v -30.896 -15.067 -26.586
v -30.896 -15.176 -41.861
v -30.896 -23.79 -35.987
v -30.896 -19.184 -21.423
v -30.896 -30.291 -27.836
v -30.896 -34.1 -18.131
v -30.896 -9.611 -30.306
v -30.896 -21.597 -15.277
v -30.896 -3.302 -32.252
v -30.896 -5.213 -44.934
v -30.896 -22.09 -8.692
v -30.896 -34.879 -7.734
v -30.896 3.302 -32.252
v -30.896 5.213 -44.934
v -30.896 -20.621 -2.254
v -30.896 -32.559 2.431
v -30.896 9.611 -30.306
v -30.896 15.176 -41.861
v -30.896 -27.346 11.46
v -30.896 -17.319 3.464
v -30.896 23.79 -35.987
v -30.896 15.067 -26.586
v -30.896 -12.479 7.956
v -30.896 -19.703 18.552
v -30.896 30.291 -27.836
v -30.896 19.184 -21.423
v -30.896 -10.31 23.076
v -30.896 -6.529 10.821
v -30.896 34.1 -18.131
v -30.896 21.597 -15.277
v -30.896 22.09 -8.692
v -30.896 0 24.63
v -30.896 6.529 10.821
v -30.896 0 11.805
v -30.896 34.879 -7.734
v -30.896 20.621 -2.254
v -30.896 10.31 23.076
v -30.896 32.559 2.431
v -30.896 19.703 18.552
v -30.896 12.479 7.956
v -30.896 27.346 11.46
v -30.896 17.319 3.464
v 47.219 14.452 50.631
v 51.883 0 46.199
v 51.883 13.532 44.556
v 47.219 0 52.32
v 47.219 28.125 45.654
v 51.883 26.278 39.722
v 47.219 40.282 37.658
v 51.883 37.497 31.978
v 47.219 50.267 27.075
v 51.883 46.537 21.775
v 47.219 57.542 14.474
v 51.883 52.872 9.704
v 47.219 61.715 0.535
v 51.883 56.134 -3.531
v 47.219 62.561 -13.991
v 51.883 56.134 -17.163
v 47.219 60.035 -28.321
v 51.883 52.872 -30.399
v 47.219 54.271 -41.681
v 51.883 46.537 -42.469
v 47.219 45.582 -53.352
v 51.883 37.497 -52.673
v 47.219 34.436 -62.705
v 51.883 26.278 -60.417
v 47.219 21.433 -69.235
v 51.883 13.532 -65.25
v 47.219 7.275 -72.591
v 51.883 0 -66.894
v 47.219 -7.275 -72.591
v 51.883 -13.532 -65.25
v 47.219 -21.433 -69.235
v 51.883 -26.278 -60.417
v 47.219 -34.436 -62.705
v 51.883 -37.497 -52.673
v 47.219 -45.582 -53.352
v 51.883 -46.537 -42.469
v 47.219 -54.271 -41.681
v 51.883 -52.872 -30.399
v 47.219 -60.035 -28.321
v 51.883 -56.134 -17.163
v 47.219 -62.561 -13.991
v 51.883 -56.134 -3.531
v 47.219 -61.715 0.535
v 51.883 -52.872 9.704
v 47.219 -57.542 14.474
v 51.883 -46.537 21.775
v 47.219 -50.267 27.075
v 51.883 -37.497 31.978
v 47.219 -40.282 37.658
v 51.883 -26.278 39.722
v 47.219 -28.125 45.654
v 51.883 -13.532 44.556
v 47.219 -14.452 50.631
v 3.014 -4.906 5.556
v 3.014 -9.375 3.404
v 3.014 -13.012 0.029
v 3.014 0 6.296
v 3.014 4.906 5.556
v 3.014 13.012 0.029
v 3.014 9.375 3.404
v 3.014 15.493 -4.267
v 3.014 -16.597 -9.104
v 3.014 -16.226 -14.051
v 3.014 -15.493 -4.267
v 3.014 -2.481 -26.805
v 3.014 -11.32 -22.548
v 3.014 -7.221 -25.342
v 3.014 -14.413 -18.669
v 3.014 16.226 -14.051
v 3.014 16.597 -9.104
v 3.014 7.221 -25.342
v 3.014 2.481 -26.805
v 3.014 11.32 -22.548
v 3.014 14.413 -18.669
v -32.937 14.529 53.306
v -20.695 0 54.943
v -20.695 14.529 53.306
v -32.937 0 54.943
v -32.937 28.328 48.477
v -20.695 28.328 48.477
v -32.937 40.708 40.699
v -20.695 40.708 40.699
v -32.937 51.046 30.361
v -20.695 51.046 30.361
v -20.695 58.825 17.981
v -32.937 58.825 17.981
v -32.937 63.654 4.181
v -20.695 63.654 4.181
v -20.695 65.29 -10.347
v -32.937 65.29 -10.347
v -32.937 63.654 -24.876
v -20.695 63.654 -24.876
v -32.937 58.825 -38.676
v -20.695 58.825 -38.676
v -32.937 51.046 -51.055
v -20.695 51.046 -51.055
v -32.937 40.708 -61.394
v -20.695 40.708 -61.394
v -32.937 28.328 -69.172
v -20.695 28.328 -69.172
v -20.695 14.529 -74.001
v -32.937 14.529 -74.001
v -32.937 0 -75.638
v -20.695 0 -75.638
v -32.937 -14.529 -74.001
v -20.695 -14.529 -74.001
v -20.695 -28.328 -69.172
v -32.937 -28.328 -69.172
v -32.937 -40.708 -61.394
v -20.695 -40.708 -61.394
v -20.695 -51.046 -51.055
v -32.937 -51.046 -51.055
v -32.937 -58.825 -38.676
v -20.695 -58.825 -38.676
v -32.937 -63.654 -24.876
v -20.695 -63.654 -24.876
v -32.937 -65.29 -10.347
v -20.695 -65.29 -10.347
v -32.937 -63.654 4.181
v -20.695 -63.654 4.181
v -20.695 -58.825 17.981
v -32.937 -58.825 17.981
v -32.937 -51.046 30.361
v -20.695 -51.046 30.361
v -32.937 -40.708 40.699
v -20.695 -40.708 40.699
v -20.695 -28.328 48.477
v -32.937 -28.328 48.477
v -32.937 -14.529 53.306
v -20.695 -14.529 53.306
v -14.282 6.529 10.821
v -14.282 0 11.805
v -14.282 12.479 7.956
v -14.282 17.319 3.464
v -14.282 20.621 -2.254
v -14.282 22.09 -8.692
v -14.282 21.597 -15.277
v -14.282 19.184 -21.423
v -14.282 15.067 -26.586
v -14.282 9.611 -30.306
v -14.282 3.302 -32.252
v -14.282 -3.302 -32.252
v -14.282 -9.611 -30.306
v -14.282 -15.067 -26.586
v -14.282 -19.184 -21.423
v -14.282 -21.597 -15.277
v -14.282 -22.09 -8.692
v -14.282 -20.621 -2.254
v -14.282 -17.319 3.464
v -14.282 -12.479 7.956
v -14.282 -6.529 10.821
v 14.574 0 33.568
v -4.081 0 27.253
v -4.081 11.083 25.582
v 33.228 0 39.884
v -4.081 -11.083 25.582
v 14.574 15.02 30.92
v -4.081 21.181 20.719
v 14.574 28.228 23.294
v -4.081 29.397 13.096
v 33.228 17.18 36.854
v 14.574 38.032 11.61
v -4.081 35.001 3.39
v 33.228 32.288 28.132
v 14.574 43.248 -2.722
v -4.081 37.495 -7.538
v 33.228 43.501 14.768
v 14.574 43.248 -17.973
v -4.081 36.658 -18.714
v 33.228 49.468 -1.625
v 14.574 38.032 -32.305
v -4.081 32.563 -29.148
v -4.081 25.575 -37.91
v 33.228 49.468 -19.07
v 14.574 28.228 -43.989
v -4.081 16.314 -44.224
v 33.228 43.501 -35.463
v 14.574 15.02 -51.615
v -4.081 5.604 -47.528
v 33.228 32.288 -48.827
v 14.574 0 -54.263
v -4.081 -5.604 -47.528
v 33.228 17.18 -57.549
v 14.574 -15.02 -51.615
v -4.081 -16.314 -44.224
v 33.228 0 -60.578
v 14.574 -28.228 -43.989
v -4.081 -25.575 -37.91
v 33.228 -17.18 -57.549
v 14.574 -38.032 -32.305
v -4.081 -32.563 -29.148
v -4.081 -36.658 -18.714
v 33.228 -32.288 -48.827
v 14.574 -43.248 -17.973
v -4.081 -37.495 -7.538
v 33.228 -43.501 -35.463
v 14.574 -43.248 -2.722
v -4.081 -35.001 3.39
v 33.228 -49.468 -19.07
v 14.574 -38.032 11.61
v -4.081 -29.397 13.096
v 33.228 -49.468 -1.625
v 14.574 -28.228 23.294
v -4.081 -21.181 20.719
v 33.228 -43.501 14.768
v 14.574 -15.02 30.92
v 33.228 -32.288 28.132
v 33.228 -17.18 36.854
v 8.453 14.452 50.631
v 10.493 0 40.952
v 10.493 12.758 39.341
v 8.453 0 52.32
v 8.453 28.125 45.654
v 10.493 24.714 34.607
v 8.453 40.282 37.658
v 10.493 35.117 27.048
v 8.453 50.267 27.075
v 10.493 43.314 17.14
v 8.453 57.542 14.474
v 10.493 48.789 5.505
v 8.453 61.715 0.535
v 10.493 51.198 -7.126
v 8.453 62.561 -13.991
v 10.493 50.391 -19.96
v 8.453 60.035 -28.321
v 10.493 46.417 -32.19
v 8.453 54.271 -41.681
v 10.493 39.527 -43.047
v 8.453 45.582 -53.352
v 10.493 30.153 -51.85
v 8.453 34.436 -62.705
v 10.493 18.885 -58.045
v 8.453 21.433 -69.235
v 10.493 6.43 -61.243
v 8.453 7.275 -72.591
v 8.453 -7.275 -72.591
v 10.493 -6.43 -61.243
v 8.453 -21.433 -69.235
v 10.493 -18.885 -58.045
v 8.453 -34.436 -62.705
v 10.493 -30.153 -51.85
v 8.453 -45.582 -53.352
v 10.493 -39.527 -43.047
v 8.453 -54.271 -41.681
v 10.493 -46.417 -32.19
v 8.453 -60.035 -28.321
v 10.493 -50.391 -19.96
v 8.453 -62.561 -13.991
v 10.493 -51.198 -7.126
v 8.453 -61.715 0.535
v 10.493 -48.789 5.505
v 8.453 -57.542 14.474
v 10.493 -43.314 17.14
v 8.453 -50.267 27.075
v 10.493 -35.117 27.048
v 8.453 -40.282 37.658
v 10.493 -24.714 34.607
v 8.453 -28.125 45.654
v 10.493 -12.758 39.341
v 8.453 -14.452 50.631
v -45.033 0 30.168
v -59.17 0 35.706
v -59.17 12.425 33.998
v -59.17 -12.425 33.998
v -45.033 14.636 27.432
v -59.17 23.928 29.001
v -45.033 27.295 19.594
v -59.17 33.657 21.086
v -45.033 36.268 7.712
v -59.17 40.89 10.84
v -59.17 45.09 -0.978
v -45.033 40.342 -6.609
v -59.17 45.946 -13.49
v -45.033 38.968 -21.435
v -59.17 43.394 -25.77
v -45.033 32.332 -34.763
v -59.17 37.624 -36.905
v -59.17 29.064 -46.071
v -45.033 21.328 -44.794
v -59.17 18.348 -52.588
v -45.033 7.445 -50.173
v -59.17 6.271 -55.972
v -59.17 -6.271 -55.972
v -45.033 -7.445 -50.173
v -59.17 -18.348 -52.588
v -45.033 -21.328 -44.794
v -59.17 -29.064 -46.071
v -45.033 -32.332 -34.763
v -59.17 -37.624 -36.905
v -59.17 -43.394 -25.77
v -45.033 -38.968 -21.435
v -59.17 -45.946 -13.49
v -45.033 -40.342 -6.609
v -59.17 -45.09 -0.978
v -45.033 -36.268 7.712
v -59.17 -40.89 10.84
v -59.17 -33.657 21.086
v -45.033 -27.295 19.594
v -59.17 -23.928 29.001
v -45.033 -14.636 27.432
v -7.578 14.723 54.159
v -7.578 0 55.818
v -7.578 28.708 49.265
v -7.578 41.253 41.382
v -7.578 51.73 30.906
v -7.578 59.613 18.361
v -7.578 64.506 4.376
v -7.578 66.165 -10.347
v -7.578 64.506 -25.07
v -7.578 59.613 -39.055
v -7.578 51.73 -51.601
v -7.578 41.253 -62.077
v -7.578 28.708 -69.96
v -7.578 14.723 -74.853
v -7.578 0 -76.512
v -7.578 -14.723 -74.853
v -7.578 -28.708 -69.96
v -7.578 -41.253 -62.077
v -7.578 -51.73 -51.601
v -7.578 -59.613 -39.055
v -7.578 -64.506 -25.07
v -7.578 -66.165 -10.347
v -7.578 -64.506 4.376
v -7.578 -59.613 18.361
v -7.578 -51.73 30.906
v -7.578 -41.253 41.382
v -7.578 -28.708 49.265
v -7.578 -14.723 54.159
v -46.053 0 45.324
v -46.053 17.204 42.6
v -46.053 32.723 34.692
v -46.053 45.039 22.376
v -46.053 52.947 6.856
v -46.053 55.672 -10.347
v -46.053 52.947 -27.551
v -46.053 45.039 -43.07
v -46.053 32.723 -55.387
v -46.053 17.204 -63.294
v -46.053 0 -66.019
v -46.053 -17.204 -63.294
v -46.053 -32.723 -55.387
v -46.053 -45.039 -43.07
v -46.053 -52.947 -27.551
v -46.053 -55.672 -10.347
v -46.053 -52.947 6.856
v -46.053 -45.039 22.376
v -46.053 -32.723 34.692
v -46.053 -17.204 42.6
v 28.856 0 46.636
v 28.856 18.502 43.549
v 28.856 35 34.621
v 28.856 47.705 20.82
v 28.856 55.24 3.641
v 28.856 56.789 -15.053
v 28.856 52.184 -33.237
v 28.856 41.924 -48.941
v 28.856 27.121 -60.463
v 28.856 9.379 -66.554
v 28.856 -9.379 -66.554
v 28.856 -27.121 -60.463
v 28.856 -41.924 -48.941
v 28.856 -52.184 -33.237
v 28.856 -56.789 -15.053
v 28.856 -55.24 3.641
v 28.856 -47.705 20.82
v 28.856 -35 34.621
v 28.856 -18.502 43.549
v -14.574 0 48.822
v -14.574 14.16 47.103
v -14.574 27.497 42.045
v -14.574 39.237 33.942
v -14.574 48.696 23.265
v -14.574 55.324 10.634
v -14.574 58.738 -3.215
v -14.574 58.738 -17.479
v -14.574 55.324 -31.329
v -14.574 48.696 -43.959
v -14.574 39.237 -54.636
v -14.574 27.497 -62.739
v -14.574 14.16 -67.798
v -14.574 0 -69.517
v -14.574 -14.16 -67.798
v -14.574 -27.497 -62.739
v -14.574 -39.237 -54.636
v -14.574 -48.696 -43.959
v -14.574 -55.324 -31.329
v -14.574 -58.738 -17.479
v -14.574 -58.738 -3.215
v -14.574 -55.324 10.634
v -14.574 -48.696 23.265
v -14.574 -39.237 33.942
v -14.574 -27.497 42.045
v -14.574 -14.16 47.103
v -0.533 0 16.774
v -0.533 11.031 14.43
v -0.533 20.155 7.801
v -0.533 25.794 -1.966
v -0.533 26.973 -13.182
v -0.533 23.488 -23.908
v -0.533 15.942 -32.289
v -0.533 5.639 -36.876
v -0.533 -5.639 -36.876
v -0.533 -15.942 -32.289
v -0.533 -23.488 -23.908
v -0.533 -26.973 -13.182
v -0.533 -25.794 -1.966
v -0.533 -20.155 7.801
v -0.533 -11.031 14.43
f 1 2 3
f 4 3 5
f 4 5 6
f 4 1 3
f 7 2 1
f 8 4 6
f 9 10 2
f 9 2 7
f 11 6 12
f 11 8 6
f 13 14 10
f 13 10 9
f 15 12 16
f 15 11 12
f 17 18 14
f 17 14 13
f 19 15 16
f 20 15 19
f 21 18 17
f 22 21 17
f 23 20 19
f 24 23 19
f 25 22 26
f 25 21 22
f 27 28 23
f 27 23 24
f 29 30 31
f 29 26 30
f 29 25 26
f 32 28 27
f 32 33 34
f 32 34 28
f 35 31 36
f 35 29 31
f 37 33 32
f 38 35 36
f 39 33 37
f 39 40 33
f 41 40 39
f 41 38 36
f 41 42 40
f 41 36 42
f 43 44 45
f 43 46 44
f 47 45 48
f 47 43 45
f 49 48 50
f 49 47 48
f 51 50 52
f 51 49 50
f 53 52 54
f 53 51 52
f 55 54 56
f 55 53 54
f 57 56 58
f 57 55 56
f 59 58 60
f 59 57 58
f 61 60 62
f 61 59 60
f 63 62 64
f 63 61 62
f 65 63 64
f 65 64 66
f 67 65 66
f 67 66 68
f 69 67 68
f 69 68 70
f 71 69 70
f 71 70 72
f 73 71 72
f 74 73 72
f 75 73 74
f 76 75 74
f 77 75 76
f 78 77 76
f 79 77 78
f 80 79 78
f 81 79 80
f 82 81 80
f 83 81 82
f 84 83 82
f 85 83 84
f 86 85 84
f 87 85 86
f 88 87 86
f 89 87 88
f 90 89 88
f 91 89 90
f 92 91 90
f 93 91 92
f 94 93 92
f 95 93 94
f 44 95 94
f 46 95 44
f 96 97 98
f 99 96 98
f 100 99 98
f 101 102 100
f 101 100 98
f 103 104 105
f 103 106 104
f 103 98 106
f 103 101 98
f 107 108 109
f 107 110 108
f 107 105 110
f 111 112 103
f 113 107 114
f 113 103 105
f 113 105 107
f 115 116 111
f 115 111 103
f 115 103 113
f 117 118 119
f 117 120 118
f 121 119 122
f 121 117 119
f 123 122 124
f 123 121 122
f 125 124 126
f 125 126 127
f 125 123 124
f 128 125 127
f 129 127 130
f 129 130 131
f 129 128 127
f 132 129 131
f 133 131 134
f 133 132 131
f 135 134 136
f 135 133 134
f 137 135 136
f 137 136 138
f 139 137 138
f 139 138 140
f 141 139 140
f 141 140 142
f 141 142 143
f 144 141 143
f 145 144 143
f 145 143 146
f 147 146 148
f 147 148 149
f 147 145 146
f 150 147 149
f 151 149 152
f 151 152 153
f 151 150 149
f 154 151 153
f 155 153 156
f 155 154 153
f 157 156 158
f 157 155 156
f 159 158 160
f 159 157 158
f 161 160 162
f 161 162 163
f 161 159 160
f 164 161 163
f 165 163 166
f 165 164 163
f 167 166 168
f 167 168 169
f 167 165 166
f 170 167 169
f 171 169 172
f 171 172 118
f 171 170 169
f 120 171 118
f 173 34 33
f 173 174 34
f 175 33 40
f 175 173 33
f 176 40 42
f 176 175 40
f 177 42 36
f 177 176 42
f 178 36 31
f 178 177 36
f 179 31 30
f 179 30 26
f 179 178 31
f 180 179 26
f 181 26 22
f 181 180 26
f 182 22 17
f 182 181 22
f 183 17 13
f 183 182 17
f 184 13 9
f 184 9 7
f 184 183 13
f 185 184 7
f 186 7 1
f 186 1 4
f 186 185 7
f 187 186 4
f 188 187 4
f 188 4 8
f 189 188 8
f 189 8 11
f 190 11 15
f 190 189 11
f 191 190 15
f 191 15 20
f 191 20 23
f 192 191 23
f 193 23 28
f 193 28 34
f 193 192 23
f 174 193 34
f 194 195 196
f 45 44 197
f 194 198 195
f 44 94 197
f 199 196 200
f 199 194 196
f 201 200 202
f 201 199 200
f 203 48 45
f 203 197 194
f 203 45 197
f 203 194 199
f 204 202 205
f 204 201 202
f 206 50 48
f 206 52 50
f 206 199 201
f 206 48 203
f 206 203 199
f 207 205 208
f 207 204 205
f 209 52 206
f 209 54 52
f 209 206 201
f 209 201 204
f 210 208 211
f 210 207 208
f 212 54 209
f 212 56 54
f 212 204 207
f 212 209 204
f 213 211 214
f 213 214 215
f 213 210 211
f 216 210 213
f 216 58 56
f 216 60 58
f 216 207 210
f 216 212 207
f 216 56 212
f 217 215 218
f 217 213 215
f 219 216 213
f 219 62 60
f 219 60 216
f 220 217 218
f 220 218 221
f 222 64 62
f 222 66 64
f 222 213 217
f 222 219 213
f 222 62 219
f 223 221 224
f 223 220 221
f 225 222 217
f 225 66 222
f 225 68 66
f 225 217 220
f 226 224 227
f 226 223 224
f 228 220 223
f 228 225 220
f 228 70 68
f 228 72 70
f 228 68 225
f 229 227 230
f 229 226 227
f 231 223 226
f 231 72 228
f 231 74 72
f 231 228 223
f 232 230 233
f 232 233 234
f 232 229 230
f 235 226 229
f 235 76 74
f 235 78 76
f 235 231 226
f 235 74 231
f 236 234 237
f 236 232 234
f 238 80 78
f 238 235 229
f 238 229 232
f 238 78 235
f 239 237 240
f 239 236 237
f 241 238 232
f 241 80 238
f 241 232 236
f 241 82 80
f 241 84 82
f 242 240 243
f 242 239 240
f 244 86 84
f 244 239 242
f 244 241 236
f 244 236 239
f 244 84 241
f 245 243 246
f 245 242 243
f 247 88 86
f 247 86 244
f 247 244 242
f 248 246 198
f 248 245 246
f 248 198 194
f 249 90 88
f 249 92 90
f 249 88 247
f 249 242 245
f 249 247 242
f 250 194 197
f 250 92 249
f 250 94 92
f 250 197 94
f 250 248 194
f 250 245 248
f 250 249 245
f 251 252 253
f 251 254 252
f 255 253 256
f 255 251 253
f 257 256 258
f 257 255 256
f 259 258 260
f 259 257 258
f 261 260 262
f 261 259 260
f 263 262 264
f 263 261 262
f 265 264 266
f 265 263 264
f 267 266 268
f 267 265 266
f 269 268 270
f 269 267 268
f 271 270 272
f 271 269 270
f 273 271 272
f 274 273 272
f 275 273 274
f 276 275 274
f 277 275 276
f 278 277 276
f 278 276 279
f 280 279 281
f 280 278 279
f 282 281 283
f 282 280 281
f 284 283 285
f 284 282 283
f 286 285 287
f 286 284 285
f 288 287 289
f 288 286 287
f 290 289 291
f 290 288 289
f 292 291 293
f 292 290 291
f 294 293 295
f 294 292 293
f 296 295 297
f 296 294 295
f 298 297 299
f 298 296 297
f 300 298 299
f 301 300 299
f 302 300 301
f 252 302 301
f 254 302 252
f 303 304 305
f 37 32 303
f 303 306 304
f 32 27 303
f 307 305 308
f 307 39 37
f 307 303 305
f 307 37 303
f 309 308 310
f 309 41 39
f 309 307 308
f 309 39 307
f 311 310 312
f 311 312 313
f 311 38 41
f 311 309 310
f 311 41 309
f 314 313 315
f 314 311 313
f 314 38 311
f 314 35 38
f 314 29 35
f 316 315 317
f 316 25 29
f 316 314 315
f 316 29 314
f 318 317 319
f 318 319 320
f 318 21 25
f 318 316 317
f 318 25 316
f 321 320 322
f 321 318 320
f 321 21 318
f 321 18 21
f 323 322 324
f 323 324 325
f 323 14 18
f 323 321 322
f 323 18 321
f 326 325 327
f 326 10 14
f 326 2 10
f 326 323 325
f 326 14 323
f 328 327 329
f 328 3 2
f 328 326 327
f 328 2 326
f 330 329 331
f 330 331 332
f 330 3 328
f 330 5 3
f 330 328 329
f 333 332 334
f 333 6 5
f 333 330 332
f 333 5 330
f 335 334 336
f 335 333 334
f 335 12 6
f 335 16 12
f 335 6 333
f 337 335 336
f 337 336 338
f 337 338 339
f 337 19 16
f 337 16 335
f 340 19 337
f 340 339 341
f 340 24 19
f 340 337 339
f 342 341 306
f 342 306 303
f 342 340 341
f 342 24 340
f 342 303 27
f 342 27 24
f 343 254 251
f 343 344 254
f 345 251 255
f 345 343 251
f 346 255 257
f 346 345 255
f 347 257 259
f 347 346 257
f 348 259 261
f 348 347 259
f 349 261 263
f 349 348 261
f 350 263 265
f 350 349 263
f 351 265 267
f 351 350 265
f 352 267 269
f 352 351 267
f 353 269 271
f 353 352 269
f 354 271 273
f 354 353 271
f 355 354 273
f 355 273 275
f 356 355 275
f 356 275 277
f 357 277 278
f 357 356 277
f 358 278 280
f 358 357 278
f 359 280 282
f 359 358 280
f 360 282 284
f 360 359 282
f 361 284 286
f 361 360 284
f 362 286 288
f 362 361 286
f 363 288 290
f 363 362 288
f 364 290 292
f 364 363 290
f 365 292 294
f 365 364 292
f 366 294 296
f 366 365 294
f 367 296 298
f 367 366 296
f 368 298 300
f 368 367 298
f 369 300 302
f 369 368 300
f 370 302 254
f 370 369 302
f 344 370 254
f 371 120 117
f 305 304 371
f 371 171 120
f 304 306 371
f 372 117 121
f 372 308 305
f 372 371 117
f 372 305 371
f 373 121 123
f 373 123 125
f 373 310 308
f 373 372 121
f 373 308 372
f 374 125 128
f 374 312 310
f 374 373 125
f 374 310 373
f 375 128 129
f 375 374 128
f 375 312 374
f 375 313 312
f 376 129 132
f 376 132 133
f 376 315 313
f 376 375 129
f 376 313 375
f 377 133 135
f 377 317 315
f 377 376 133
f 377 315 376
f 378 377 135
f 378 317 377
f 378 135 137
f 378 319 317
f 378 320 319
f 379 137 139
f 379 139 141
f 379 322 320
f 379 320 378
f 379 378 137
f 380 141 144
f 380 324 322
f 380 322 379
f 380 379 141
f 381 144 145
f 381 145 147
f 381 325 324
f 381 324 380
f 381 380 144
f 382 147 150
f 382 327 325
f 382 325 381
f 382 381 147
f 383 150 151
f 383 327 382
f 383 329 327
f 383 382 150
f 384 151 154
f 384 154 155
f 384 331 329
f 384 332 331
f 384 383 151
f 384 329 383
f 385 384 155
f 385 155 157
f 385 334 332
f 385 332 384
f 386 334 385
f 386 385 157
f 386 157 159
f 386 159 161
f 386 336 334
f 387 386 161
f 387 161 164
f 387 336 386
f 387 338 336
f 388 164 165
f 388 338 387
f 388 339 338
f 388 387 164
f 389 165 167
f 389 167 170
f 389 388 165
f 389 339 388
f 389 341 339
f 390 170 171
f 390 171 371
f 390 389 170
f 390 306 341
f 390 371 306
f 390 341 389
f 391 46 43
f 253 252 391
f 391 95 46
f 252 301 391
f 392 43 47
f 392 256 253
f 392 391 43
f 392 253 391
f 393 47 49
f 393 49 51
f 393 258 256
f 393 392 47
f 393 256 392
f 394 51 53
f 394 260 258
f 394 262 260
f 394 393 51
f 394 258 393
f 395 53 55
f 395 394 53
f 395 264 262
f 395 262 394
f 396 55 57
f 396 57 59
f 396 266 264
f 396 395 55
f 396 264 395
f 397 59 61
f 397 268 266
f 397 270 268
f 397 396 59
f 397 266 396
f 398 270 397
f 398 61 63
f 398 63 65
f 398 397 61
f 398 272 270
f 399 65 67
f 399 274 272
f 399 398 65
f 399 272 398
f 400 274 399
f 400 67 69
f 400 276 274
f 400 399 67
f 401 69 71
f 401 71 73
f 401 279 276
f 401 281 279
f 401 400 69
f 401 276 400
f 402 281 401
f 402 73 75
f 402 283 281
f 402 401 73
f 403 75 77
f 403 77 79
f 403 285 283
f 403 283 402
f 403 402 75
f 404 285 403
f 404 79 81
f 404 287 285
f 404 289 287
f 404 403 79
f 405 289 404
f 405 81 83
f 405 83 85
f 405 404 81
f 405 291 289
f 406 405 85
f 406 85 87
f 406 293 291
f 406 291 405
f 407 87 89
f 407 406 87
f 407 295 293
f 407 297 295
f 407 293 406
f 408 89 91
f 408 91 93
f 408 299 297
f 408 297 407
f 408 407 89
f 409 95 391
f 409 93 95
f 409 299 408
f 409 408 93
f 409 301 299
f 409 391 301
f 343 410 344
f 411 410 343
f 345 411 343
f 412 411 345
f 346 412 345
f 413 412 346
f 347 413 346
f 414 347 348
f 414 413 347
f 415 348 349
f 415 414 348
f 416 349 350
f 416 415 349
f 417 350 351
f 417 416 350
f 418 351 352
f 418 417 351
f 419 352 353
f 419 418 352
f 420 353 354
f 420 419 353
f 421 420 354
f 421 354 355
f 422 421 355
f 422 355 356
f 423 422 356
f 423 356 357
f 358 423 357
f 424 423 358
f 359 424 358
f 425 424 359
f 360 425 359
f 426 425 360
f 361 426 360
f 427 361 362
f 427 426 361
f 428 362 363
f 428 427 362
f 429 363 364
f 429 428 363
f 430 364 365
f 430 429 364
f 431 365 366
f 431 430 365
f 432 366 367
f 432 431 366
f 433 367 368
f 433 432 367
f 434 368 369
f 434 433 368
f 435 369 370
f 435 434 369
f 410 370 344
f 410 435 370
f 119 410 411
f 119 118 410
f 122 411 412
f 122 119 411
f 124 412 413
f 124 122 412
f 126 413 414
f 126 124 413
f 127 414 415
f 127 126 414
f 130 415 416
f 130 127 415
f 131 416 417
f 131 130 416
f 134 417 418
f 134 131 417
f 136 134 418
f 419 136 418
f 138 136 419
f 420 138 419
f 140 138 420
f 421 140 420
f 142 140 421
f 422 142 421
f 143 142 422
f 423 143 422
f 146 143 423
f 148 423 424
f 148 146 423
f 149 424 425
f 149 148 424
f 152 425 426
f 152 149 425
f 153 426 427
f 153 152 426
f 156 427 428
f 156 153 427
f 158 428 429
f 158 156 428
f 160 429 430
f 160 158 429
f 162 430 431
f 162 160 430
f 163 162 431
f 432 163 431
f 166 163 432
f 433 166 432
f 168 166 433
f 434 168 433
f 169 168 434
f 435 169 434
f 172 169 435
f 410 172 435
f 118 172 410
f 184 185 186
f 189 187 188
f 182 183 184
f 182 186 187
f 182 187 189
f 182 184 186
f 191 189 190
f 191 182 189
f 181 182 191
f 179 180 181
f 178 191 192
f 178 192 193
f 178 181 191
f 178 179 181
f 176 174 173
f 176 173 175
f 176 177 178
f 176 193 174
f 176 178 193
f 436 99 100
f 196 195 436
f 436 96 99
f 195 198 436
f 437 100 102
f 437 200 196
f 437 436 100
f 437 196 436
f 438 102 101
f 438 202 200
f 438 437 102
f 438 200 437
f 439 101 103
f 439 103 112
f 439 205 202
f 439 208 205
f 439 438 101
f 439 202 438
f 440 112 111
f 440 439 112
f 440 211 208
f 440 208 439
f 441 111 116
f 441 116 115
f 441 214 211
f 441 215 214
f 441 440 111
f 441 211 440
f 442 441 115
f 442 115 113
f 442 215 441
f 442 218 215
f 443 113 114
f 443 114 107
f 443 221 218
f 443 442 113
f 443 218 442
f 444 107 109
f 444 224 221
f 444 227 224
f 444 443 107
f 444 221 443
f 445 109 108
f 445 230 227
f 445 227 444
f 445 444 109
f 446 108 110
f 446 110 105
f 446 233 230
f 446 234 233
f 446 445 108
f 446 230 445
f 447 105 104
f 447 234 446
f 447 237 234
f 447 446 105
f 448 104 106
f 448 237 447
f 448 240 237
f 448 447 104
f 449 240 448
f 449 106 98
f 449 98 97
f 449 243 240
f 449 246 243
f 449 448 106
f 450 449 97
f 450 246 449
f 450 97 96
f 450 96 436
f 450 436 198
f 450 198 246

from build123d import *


with BuildPart() as f1:
    # F0 (on Front) → F1 (revolve)
    with BuildSketch(Plane.XZ):
        Polygon((-20.694755, 54.943115), (-32.936722, 54.943115), (-59.169509, 35.705738), (-30.896394, 24.629673), (-30.896394, 11.804755), (-14.282295, 11.804755), (-14.282295, -10.347377), (3.014203, -10.347377), (3.014203, 6.295834), (-4.080656, 27.25295), (51.882621, 46.198856), (47.219016, 52.31984), (10.493115, 40.952295), (8.452787, 52.31984), (-7.57836, 55.817542), (-14.573772, 48.822131), align=None)
    revolve(axis=Axis((-5.634046, 0, -10.347377), (-1, 0, 0)))


solid = f1.part
